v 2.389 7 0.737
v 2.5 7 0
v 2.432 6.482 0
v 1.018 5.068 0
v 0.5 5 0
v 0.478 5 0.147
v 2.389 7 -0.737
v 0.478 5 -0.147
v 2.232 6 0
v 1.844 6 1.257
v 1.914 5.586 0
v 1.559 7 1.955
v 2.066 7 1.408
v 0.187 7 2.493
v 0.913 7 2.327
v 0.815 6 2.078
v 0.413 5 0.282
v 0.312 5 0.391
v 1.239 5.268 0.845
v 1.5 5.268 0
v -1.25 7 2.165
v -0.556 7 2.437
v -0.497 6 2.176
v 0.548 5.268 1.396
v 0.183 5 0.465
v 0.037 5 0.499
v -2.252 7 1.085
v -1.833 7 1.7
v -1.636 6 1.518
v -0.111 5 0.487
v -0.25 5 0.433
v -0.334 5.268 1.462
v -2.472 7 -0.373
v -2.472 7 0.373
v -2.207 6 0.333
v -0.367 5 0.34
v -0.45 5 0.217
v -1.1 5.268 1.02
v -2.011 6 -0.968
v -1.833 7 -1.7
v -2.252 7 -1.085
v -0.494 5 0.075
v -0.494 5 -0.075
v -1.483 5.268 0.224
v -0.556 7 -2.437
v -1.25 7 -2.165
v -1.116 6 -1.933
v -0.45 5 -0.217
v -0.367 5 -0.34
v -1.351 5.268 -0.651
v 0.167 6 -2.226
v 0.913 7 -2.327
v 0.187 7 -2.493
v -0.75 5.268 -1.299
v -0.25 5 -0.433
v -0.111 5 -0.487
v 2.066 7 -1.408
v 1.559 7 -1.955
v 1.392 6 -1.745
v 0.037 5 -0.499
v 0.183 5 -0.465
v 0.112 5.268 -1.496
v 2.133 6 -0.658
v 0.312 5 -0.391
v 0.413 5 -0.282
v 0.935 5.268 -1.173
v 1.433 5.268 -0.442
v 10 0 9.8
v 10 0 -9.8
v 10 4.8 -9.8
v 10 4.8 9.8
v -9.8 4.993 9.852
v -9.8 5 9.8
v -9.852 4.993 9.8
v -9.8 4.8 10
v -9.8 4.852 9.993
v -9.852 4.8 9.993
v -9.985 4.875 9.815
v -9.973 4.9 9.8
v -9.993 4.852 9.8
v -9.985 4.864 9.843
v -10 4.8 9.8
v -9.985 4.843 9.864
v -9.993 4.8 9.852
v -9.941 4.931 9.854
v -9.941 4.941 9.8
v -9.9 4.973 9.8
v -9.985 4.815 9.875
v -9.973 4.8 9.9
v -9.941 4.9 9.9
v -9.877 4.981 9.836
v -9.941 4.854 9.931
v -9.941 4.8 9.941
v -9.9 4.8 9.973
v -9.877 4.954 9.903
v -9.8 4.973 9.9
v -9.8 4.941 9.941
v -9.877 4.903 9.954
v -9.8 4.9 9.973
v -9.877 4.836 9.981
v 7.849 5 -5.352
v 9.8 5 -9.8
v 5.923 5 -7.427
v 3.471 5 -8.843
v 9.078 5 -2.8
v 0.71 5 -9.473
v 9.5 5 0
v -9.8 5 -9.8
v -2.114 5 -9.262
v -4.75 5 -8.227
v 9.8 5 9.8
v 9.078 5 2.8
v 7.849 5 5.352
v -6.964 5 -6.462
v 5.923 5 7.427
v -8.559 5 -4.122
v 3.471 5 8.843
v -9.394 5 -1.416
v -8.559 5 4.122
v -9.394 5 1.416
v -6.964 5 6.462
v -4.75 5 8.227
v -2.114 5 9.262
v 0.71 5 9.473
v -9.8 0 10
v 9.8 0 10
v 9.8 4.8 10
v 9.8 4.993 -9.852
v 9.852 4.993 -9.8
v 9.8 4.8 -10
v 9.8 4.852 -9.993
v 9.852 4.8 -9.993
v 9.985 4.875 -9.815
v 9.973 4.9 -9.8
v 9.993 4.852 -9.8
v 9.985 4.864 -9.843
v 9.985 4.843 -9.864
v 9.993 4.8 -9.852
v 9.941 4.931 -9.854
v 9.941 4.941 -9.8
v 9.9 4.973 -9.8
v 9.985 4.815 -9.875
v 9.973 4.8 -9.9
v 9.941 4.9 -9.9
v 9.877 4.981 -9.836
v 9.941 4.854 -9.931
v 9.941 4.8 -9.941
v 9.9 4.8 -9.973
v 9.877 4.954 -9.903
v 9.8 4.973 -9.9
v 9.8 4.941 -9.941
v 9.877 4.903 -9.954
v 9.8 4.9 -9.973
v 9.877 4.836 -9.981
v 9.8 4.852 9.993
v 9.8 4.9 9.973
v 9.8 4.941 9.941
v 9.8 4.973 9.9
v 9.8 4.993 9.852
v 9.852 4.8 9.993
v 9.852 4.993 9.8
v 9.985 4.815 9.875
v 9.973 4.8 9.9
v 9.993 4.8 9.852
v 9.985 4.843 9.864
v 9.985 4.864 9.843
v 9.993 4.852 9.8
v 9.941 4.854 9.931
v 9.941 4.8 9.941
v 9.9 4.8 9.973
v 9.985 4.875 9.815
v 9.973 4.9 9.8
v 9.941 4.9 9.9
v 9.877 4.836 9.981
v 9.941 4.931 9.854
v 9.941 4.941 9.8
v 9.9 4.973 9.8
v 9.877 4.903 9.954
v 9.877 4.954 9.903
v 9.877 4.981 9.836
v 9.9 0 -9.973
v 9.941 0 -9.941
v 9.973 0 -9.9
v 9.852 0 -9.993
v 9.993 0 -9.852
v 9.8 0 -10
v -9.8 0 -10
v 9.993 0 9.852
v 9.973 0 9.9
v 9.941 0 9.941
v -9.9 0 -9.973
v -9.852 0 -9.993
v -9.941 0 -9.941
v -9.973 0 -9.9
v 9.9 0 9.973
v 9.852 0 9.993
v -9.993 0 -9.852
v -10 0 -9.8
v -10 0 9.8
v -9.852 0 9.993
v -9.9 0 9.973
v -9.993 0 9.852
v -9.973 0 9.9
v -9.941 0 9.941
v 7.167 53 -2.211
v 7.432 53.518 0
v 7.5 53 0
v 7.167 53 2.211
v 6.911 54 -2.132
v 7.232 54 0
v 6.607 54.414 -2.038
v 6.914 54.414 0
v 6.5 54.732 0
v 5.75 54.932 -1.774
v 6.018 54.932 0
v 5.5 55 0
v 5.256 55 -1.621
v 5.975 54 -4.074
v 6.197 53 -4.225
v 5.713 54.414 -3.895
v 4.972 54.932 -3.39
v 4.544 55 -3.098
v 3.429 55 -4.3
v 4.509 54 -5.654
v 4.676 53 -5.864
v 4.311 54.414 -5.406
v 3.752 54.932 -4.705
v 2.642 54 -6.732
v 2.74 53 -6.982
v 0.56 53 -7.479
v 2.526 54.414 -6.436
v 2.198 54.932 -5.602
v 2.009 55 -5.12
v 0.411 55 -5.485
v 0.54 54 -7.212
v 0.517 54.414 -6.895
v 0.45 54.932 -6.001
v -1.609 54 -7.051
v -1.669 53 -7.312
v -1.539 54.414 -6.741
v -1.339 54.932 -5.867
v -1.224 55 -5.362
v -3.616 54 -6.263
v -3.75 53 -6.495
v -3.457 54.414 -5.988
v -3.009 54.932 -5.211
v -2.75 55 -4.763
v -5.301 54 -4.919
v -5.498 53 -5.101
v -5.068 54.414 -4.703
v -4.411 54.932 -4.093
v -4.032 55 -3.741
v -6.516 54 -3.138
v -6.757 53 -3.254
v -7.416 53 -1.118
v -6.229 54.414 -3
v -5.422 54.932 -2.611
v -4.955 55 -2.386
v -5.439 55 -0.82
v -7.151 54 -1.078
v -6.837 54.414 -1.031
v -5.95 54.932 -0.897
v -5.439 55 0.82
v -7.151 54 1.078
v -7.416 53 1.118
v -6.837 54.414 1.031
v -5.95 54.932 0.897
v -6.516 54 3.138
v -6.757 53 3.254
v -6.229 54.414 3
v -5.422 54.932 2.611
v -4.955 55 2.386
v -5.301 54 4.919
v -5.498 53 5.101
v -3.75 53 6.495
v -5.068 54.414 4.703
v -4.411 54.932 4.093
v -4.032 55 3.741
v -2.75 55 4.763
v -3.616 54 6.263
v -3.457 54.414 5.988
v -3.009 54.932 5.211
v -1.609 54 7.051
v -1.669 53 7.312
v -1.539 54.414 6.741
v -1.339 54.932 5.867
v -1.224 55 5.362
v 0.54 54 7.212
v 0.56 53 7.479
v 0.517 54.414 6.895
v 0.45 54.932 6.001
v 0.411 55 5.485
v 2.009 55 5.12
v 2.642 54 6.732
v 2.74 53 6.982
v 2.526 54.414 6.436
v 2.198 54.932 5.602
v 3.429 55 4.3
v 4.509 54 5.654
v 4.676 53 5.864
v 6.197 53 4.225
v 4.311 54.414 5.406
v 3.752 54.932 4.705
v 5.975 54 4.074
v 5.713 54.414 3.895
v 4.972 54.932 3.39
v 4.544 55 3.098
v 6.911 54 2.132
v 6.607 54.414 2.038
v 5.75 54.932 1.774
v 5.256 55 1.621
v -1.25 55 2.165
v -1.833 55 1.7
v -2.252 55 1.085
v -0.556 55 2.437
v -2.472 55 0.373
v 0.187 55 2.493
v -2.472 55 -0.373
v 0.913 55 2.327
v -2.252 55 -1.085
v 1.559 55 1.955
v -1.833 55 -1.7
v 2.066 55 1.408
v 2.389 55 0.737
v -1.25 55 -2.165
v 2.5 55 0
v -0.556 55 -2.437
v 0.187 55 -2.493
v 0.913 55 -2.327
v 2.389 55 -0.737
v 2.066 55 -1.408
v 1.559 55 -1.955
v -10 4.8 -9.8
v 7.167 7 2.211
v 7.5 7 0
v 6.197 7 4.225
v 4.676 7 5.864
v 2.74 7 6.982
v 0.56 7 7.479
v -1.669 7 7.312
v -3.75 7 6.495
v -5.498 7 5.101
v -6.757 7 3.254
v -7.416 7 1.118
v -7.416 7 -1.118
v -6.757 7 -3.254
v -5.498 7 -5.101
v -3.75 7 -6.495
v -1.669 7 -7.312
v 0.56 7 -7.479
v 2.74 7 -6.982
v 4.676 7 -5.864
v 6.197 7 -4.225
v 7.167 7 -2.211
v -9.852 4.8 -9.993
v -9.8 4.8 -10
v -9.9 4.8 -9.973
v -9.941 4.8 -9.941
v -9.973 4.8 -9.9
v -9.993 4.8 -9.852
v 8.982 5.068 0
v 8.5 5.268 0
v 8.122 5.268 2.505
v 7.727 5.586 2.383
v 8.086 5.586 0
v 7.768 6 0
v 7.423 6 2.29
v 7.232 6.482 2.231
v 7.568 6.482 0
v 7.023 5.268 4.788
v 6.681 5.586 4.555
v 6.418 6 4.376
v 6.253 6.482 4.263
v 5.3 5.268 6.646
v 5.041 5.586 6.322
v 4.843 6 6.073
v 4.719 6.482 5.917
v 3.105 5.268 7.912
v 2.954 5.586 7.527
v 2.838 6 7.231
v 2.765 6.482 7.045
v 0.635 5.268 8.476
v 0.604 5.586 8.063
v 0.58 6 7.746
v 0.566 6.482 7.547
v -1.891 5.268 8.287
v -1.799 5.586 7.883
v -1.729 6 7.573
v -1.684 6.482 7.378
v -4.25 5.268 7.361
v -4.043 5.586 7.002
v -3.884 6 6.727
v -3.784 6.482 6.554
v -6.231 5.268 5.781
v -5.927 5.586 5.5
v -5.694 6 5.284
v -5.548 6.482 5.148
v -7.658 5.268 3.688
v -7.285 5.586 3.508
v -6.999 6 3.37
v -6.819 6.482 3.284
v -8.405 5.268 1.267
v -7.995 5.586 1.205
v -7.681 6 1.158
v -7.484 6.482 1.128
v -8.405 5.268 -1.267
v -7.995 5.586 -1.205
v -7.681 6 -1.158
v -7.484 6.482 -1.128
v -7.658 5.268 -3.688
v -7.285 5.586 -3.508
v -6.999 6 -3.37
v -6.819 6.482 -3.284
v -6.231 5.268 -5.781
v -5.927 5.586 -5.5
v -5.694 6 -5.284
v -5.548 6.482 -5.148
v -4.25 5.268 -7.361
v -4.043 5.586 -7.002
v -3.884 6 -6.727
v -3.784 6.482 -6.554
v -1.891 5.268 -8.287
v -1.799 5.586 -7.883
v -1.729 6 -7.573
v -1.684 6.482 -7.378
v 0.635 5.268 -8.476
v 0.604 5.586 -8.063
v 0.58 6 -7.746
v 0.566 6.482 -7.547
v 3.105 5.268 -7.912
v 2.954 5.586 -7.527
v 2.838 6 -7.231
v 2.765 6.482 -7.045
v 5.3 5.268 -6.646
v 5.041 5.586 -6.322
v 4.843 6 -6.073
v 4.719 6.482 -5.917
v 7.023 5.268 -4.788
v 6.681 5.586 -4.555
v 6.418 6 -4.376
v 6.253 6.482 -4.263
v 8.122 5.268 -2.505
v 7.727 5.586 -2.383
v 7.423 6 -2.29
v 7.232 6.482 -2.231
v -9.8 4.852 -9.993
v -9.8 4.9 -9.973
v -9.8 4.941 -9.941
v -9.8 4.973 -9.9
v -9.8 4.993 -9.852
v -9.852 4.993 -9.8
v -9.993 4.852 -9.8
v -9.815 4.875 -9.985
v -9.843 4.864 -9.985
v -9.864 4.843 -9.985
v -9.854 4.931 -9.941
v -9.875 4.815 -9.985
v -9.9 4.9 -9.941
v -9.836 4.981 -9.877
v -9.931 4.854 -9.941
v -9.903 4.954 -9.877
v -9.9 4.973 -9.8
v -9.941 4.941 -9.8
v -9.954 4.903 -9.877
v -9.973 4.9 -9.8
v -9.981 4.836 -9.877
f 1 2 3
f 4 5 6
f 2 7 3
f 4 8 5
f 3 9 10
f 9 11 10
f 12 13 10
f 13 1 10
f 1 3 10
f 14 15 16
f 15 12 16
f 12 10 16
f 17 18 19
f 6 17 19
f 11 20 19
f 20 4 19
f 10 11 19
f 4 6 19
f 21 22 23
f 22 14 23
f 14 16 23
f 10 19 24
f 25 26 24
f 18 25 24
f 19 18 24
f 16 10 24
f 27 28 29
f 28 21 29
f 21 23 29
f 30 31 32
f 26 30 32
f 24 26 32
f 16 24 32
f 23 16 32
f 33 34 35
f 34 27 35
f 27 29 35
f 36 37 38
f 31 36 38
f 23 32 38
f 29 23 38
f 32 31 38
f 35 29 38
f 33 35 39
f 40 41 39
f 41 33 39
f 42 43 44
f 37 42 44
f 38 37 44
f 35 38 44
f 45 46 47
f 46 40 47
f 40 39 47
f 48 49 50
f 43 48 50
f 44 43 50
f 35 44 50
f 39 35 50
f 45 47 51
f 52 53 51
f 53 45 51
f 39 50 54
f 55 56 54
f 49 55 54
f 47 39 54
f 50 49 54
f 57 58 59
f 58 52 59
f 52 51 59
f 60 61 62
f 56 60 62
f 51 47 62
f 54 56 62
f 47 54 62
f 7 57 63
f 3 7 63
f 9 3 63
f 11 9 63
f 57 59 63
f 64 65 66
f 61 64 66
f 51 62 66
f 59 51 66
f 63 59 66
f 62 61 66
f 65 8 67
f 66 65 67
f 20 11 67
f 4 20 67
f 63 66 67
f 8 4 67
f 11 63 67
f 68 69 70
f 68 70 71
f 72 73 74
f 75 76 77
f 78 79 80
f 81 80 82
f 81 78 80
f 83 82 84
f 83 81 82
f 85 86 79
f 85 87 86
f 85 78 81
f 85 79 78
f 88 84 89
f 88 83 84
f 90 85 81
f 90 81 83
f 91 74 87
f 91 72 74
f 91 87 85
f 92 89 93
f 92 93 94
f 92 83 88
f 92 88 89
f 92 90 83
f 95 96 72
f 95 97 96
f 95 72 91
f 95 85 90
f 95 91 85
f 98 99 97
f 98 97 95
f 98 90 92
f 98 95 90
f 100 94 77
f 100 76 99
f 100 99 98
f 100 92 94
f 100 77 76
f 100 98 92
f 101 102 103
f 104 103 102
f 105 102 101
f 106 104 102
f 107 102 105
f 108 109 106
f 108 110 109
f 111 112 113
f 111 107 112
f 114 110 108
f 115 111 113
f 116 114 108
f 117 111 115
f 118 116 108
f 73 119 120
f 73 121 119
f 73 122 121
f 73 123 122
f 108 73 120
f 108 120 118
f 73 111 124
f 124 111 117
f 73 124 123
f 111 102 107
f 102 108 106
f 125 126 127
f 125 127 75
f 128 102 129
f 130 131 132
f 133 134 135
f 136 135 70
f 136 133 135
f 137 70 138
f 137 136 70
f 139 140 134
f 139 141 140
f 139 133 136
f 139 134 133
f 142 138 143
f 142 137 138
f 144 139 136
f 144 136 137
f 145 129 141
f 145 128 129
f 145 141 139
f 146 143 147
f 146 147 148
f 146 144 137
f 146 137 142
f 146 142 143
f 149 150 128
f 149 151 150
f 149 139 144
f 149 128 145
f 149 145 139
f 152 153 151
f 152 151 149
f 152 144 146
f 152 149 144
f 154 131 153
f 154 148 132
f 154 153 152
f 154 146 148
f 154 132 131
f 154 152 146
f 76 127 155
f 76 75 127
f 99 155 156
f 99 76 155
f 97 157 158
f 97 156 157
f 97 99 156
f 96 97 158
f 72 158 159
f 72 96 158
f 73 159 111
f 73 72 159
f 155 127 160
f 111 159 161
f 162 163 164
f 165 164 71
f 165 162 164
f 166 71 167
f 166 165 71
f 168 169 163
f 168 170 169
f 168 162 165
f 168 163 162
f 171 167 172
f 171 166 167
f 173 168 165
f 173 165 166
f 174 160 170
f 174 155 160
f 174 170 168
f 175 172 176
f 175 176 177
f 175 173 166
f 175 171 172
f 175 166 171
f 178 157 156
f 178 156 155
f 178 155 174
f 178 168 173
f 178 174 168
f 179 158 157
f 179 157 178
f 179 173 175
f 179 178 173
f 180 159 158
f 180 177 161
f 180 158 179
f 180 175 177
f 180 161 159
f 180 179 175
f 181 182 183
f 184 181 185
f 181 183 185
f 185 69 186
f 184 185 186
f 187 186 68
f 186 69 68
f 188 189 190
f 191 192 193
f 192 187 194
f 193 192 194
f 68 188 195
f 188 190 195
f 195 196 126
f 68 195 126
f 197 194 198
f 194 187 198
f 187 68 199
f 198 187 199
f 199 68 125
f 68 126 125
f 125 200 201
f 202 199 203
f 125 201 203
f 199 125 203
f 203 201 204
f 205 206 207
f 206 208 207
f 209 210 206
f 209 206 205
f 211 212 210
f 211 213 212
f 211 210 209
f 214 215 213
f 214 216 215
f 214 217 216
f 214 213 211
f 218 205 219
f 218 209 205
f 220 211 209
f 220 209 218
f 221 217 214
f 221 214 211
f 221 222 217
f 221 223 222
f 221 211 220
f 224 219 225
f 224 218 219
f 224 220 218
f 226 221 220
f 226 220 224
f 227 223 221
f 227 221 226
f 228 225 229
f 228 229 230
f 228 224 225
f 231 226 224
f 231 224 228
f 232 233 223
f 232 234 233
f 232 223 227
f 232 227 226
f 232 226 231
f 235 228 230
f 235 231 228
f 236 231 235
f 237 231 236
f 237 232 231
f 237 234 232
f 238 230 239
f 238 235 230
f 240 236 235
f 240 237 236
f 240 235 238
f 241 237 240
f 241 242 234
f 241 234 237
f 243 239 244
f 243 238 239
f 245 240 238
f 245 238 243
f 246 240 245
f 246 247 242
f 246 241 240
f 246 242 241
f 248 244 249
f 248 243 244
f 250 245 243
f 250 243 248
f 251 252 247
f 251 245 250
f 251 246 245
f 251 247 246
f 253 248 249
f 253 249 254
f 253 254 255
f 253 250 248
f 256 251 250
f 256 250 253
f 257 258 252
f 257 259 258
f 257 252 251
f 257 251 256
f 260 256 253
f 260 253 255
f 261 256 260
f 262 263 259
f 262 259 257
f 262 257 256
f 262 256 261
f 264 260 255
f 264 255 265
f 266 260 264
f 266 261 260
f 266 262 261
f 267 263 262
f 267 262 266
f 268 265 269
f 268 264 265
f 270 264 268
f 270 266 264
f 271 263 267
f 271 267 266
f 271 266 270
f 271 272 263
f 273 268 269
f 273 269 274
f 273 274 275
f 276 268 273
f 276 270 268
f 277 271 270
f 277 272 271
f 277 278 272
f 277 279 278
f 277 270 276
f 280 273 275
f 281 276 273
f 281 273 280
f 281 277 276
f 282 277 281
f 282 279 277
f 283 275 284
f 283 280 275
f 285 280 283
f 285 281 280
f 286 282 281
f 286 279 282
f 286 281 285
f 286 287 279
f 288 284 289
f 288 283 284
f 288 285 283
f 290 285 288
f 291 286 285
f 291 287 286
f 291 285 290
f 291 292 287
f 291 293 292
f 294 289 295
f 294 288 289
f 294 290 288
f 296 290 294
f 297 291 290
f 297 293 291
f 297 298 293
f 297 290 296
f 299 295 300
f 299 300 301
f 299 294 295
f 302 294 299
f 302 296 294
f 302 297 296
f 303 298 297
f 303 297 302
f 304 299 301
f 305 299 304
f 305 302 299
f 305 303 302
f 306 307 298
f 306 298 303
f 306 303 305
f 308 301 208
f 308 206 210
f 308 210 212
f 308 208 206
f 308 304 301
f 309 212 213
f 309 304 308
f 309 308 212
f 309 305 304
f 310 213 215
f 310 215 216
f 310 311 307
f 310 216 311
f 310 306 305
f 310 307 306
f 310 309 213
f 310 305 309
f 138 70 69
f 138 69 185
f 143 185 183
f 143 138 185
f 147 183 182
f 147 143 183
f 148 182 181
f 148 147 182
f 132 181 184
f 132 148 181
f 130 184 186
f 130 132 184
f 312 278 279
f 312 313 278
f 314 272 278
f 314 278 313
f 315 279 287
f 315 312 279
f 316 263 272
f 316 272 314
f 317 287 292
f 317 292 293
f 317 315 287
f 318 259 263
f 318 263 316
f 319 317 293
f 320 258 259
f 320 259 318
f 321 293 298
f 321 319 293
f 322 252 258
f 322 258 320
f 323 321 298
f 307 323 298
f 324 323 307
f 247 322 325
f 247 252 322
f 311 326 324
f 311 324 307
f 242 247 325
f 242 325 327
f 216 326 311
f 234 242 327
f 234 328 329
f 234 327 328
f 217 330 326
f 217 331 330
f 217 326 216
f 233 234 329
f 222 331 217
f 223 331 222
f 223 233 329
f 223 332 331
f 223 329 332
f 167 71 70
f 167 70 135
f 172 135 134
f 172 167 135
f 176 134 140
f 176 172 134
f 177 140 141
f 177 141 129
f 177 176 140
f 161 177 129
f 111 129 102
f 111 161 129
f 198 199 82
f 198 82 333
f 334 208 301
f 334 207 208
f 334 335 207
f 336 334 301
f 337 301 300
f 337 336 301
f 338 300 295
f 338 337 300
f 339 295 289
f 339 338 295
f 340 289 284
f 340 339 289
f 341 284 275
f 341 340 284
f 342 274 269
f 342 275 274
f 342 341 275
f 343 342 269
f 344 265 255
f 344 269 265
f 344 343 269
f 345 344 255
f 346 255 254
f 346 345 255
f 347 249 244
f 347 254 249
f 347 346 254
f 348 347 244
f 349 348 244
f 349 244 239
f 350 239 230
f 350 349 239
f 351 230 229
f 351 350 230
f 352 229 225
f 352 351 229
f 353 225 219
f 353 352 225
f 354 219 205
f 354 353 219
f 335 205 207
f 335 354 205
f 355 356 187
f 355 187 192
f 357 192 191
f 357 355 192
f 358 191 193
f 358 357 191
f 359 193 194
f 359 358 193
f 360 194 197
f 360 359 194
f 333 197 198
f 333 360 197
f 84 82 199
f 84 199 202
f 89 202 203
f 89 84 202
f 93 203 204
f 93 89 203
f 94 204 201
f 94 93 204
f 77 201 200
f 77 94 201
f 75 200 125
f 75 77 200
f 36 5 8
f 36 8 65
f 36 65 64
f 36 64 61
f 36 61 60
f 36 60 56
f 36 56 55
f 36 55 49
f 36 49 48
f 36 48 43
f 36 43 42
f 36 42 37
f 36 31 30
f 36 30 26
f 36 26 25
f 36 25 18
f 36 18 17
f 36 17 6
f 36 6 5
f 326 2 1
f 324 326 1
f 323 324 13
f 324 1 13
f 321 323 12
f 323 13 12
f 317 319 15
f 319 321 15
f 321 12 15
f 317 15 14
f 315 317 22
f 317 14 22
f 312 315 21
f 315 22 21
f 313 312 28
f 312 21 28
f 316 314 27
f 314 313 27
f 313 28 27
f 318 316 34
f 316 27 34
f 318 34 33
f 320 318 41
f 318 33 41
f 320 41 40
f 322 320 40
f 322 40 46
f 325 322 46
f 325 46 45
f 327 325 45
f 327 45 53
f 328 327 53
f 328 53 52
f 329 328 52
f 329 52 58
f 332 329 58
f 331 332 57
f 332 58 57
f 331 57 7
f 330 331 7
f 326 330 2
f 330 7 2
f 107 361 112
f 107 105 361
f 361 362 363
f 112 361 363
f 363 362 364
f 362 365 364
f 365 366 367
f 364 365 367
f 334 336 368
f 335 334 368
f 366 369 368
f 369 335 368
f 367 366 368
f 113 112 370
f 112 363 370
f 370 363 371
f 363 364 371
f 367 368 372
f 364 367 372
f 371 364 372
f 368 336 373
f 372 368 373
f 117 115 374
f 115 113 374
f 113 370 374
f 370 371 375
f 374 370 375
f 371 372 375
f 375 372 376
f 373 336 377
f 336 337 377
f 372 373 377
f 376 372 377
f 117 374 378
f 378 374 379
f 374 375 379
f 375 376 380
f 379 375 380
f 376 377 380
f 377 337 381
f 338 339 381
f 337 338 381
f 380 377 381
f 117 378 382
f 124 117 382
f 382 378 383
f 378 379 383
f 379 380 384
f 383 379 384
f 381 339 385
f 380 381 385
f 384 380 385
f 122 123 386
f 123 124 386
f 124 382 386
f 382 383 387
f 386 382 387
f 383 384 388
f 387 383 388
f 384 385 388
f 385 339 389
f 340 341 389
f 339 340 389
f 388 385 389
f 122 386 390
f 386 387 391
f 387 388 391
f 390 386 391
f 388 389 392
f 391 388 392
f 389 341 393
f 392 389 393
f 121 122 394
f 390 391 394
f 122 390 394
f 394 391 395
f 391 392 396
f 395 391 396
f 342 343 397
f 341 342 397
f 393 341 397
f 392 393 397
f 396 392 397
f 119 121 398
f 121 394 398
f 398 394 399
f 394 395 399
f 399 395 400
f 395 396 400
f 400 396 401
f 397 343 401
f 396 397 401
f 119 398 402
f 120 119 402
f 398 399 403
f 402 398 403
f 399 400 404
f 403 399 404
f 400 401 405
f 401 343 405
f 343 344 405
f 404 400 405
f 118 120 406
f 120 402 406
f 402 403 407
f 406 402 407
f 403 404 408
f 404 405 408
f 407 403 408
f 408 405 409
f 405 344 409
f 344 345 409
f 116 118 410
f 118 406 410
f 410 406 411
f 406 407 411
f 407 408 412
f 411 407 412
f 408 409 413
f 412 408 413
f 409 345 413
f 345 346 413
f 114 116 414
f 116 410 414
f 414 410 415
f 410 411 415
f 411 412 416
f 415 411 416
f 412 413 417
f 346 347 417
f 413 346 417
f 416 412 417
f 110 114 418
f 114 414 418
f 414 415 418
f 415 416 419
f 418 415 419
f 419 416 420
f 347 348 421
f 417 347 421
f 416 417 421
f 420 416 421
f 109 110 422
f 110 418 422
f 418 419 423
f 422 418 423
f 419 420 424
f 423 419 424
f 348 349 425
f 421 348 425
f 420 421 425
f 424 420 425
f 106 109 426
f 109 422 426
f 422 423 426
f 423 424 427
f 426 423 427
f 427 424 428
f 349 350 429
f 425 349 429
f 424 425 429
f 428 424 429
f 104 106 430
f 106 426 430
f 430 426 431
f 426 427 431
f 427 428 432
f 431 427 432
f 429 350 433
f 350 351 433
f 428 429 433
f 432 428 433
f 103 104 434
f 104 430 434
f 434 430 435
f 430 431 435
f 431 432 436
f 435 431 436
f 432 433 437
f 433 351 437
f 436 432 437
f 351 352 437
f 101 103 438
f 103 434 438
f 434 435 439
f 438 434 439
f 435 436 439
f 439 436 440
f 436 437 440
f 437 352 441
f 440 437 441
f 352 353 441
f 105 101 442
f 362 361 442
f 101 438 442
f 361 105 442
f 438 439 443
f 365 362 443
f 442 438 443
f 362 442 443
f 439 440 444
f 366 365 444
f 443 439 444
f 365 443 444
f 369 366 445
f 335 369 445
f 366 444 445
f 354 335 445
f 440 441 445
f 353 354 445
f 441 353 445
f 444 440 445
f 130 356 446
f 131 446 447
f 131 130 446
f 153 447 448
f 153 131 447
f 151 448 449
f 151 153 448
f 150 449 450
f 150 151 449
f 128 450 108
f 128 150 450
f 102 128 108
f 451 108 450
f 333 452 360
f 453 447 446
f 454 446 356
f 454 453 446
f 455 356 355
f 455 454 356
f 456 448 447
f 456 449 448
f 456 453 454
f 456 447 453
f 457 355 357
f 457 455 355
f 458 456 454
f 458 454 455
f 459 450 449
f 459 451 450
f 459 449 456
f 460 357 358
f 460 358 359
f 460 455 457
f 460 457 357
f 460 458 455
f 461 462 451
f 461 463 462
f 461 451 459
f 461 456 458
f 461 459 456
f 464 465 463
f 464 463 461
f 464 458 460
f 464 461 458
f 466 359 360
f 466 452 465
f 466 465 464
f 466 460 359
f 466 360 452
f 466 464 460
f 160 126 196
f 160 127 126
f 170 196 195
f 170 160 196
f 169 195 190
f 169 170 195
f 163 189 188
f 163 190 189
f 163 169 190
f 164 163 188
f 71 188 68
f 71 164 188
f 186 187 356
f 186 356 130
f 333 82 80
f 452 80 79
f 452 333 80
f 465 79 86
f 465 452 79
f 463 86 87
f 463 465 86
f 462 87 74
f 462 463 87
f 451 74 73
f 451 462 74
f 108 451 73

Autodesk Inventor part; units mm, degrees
ref_plane "YZ Plane" through (0, 0, 0) normal (1, 0, 0) x (0, 1, 0)
ref_plane "XZ Plane" through (0, 0, 0) normal (0, 1, 0) x (-1, 0, 0)
ref_plane "XY Plane" through (0, 0, 0) normal (0, 0, 1) x (1, 0, 0)
sketch "スケッチ1" plane through (0, 0, 0) normal (0, 1, 0) x (-1, 0, 0)
  line L0 (10, -10) -> (-10, -10)
  line L1 (-10, -10) -> (-10, 10)
  line L2 (-10, 10) -> (10, 10)
  line L3 (10, 10) -> (10, -10)
  line L4 (10, -10) -> (-10, 10) construction
  line L5 (-10, -10) -> (10, 10) construction
  point P0 (0, 0)
  dimension "d0" = 20
  dimension "d1" = 20
extrude "押し出し1" add sketch "スケッチ1" along normal blind 5
fillet "フィレット1" radius 0.2 8 edges at (0, 5, 10) (-10, 5, 0) (0, 5, -10) (10, 5, 0) (10, 2.5, 10) (-10, 2.5, 10) (-10, 2.5, -10) (10, 2.5, -10)
sketch "スケッチ2" plane through (0, 5, 0) normal (0, 1, 0) x (1, 0, 0)
  circle A0 centre (0, 0) radius 7.5
  circle A1 centre (0, 0) radius 2.5
  dimension "d9" = 2
  dimension "d5" = 15
  dimension "d6" = 5
extrude "押し出し2" add sketch "スケッチ2" along normal blind 50
fillet "フィレット2" radius 2 3 edges at (-7.5, 55, 0) (-7.5, 5, 0) (-2.5, 5, 0)
properties part number "baseA"
